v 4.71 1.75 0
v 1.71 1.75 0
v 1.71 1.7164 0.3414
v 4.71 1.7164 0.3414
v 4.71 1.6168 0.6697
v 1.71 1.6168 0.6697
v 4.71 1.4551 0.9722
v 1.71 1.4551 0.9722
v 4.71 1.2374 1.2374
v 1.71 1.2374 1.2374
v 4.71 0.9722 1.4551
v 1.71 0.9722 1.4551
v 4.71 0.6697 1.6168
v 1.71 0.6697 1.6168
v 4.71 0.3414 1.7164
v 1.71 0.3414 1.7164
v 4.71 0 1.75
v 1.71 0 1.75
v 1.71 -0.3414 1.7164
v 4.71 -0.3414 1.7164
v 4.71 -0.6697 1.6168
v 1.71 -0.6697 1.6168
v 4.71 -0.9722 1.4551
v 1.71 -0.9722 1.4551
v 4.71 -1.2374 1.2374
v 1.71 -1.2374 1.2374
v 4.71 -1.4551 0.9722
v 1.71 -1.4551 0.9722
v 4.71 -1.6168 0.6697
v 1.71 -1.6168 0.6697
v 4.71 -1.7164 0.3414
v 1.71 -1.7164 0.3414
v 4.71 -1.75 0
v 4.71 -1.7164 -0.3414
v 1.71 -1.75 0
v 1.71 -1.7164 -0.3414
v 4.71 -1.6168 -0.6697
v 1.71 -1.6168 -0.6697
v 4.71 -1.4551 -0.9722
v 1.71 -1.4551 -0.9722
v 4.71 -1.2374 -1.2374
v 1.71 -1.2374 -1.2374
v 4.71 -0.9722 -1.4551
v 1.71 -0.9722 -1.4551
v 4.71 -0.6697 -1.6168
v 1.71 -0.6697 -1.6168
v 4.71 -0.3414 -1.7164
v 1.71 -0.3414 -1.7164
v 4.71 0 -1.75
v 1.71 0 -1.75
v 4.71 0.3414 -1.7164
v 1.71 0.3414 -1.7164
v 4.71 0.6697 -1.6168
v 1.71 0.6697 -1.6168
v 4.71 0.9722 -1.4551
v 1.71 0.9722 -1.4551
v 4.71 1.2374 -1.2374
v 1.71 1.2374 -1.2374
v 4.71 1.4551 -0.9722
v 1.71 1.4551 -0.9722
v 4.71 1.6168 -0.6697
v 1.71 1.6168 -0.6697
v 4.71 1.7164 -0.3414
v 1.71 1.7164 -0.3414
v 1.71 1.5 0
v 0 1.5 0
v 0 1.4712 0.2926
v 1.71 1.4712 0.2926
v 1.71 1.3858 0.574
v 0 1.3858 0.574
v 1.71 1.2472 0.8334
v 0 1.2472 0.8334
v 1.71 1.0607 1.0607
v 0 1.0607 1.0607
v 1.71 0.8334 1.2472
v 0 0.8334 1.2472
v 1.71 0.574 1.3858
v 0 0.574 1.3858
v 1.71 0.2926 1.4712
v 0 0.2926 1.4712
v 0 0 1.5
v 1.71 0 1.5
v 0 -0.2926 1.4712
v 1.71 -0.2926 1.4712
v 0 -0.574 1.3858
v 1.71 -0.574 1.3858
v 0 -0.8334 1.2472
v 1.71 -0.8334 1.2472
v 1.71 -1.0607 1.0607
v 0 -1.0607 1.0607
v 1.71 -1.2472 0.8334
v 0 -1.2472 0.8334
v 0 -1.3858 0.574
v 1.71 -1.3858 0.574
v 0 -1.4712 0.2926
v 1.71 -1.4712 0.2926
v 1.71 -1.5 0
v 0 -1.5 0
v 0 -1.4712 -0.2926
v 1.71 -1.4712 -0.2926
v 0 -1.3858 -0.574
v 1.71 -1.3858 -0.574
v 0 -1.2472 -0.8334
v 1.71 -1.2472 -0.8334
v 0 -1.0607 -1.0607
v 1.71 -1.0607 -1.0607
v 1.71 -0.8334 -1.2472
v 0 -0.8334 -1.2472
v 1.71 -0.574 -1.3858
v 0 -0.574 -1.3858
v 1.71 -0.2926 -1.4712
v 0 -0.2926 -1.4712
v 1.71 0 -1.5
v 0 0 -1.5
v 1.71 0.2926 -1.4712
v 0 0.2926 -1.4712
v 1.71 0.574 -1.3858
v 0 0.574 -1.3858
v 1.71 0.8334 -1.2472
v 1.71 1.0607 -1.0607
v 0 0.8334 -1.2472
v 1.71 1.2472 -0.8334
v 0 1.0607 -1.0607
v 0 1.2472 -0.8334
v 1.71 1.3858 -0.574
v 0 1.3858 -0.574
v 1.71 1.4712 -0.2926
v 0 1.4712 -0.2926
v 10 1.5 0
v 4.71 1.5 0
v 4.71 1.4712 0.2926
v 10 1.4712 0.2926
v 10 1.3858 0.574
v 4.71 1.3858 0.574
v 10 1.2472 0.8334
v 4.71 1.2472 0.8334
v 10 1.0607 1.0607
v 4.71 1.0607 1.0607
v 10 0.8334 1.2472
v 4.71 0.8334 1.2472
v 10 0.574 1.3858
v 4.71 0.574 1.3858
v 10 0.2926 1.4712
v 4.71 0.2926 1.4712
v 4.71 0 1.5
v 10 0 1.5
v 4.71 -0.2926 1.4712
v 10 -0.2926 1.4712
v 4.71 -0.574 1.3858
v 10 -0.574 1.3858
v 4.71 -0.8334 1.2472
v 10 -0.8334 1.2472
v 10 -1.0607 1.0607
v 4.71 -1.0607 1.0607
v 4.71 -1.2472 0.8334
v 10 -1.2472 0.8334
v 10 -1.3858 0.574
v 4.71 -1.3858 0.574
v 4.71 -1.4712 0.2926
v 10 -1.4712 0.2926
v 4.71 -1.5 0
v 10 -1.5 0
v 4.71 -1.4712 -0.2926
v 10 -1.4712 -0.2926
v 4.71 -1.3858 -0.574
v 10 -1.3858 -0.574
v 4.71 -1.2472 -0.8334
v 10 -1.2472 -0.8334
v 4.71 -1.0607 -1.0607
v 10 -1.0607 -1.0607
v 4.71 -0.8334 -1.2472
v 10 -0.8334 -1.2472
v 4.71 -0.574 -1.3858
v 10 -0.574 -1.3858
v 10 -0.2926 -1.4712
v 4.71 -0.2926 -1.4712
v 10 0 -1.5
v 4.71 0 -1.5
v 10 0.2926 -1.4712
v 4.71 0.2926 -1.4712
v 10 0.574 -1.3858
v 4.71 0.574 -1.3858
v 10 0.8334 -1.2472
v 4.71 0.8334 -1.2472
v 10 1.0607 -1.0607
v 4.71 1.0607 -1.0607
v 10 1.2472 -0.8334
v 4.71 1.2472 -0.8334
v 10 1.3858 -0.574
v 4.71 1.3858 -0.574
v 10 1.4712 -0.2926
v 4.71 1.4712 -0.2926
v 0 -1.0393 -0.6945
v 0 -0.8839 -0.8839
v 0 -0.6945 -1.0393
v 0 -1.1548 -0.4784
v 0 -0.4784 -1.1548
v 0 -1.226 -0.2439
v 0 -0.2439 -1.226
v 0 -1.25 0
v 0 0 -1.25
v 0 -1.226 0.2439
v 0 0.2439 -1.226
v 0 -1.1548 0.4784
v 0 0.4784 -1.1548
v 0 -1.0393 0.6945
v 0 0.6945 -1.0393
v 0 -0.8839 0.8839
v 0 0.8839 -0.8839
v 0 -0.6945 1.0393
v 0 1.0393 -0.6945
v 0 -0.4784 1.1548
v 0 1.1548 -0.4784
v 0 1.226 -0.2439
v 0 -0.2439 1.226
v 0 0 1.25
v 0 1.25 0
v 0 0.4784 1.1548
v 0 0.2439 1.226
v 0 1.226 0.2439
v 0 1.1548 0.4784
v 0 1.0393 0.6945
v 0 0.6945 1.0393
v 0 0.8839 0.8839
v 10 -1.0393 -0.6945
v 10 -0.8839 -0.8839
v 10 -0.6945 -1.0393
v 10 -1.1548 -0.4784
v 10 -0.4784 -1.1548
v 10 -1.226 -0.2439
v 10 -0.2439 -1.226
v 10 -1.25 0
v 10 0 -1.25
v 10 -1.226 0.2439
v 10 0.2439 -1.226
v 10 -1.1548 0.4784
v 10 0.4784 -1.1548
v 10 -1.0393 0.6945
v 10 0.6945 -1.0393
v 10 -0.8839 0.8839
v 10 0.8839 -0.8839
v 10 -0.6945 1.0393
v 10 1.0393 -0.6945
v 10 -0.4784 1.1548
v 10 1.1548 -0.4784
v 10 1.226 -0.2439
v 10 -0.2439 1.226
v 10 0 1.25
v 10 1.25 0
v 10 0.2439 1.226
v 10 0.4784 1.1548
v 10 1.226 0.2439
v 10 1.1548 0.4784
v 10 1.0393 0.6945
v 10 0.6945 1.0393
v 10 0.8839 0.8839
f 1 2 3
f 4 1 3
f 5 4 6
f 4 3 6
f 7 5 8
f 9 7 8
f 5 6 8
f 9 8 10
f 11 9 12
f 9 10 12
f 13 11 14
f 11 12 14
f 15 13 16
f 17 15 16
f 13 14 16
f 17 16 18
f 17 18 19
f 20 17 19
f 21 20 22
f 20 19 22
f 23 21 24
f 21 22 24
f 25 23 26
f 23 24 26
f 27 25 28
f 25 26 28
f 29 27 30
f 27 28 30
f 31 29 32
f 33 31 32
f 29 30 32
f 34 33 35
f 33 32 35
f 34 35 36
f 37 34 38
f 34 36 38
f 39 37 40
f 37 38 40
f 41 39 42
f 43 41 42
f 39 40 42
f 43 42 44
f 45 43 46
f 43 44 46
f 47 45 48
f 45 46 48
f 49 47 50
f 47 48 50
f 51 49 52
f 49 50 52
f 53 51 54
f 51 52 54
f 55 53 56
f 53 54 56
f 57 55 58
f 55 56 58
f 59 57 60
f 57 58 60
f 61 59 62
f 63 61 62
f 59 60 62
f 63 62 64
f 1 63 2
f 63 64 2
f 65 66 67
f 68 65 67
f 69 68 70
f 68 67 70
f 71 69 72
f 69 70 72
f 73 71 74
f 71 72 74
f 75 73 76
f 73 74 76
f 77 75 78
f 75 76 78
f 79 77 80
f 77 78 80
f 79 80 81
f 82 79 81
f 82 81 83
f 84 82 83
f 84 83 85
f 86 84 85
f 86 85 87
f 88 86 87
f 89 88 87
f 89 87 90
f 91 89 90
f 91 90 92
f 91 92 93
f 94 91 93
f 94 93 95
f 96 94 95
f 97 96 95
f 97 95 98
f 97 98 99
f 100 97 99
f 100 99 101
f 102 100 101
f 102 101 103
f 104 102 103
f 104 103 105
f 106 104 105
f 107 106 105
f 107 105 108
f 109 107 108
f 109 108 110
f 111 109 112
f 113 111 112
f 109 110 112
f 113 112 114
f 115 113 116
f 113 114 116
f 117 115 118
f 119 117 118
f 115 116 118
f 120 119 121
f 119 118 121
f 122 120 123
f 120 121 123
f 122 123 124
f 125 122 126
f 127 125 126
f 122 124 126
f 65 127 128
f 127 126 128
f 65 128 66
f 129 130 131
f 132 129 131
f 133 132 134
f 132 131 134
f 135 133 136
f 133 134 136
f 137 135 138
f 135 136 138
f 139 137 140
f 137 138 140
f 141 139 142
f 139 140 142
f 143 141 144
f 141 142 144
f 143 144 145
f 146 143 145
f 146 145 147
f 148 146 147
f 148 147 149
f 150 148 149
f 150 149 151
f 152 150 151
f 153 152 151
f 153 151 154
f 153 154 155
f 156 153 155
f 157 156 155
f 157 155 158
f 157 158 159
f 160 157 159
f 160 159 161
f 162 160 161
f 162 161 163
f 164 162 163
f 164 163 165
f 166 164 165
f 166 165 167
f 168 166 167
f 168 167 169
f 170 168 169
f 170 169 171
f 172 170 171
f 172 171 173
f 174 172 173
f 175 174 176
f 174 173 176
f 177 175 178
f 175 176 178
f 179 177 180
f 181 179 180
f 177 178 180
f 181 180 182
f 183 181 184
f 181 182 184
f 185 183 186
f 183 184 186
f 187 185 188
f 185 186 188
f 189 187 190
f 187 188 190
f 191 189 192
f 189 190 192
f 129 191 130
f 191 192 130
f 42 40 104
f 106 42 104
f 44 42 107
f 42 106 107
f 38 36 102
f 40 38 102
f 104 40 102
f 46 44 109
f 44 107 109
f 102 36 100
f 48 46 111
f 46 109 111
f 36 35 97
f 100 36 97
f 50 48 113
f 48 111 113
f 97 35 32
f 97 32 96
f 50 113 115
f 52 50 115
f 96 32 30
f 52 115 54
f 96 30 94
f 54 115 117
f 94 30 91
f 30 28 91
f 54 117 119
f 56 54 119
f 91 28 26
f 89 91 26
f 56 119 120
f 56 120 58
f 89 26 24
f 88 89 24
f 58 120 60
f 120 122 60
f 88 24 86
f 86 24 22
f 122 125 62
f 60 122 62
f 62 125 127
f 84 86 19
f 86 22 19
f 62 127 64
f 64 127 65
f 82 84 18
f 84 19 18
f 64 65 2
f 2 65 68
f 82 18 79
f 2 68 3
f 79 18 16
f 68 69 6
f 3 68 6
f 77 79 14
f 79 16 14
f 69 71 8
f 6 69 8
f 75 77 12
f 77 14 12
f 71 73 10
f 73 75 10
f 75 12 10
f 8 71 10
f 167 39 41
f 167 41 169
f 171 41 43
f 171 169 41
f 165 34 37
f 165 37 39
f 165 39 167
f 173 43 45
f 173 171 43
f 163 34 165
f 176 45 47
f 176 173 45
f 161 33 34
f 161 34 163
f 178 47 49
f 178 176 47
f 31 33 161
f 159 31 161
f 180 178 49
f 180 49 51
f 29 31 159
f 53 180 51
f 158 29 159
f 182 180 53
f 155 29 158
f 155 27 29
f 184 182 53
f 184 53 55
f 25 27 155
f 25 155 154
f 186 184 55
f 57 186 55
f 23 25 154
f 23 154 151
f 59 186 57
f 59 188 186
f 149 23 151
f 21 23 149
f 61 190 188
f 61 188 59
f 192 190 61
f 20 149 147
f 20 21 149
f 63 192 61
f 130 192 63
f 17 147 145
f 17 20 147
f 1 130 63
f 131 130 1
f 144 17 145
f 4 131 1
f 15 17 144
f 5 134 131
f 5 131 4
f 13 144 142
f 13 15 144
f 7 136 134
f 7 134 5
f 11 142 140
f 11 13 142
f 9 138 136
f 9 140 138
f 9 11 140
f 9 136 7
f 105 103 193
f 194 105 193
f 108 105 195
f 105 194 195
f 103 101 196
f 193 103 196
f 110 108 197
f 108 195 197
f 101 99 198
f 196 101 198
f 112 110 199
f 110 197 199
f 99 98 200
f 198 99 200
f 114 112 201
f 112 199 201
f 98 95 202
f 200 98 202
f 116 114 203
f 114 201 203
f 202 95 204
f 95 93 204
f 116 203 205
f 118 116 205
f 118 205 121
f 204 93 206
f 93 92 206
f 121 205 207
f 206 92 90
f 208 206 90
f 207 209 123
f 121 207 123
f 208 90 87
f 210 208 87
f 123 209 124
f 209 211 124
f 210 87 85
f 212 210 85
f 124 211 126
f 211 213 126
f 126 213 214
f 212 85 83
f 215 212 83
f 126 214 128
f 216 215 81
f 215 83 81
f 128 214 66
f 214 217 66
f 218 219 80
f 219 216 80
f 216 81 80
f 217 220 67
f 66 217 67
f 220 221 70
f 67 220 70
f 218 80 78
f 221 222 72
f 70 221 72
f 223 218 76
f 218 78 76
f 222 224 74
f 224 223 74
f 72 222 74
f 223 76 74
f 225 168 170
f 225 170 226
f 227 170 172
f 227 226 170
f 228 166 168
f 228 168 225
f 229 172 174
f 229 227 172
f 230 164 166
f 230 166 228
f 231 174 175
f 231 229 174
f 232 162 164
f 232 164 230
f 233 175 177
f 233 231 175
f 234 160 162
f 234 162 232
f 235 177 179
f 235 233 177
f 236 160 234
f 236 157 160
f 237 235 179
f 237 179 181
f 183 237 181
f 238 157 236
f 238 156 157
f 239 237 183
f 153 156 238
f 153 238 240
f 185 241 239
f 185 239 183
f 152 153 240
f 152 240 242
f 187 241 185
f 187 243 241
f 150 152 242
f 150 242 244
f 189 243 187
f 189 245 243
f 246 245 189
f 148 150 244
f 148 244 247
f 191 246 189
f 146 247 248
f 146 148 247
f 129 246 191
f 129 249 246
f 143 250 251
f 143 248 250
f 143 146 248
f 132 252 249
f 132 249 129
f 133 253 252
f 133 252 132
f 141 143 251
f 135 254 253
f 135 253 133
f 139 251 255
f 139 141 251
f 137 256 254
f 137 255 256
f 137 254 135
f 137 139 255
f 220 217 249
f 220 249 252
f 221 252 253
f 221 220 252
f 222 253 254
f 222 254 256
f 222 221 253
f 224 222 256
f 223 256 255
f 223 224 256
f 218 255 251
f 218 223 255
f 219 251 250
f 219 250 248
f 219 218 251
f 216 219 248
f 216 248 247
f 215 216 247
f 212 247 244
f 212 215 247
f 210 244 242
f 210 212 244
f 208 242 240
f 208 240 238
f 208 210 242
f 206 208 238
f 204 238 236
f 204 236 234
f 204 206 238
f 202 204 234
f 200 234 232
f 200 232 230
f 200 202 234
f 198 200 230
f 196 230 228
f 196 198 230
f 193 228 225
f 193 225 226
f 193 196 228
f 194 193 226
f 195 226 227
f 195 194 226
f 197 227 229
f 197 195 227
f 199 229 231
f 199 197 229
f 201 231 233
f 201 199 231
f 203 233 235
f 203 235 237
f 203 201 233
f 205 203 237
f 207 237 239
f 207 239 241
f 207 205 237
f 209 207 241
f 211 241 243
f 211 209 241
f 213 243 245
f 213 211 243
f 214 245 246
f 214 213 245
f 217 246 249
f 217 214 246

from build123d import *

# Parameters (mm, degrees)
F0_R     = 1.5
F0_R_2   = 1.25
F1_DEPTH = 10
F3_R     = 1.75
F3_R_2   = 1.5
F4_DEPTH = 3


with BuildPart() as f1:
    # F0 (on Right) → F1 (new body)
    with BuildSketch(Plane.YZ):
        Circle(F0_R)
        Circle(F0_R_2, mode=Mode.SUBTRACT)
    extrude(amount=F1_DEPTH)

    # F3 (on offset) → F4 (join)
    with BuildSketch(Plane.YZ.offset(1.71)):
        Circle(F3_R)
        Circle(F3_R_2, mode=Mode.SUBTRACT)
    extrude(amount=F4_DEPTH)


solid = f1.part
